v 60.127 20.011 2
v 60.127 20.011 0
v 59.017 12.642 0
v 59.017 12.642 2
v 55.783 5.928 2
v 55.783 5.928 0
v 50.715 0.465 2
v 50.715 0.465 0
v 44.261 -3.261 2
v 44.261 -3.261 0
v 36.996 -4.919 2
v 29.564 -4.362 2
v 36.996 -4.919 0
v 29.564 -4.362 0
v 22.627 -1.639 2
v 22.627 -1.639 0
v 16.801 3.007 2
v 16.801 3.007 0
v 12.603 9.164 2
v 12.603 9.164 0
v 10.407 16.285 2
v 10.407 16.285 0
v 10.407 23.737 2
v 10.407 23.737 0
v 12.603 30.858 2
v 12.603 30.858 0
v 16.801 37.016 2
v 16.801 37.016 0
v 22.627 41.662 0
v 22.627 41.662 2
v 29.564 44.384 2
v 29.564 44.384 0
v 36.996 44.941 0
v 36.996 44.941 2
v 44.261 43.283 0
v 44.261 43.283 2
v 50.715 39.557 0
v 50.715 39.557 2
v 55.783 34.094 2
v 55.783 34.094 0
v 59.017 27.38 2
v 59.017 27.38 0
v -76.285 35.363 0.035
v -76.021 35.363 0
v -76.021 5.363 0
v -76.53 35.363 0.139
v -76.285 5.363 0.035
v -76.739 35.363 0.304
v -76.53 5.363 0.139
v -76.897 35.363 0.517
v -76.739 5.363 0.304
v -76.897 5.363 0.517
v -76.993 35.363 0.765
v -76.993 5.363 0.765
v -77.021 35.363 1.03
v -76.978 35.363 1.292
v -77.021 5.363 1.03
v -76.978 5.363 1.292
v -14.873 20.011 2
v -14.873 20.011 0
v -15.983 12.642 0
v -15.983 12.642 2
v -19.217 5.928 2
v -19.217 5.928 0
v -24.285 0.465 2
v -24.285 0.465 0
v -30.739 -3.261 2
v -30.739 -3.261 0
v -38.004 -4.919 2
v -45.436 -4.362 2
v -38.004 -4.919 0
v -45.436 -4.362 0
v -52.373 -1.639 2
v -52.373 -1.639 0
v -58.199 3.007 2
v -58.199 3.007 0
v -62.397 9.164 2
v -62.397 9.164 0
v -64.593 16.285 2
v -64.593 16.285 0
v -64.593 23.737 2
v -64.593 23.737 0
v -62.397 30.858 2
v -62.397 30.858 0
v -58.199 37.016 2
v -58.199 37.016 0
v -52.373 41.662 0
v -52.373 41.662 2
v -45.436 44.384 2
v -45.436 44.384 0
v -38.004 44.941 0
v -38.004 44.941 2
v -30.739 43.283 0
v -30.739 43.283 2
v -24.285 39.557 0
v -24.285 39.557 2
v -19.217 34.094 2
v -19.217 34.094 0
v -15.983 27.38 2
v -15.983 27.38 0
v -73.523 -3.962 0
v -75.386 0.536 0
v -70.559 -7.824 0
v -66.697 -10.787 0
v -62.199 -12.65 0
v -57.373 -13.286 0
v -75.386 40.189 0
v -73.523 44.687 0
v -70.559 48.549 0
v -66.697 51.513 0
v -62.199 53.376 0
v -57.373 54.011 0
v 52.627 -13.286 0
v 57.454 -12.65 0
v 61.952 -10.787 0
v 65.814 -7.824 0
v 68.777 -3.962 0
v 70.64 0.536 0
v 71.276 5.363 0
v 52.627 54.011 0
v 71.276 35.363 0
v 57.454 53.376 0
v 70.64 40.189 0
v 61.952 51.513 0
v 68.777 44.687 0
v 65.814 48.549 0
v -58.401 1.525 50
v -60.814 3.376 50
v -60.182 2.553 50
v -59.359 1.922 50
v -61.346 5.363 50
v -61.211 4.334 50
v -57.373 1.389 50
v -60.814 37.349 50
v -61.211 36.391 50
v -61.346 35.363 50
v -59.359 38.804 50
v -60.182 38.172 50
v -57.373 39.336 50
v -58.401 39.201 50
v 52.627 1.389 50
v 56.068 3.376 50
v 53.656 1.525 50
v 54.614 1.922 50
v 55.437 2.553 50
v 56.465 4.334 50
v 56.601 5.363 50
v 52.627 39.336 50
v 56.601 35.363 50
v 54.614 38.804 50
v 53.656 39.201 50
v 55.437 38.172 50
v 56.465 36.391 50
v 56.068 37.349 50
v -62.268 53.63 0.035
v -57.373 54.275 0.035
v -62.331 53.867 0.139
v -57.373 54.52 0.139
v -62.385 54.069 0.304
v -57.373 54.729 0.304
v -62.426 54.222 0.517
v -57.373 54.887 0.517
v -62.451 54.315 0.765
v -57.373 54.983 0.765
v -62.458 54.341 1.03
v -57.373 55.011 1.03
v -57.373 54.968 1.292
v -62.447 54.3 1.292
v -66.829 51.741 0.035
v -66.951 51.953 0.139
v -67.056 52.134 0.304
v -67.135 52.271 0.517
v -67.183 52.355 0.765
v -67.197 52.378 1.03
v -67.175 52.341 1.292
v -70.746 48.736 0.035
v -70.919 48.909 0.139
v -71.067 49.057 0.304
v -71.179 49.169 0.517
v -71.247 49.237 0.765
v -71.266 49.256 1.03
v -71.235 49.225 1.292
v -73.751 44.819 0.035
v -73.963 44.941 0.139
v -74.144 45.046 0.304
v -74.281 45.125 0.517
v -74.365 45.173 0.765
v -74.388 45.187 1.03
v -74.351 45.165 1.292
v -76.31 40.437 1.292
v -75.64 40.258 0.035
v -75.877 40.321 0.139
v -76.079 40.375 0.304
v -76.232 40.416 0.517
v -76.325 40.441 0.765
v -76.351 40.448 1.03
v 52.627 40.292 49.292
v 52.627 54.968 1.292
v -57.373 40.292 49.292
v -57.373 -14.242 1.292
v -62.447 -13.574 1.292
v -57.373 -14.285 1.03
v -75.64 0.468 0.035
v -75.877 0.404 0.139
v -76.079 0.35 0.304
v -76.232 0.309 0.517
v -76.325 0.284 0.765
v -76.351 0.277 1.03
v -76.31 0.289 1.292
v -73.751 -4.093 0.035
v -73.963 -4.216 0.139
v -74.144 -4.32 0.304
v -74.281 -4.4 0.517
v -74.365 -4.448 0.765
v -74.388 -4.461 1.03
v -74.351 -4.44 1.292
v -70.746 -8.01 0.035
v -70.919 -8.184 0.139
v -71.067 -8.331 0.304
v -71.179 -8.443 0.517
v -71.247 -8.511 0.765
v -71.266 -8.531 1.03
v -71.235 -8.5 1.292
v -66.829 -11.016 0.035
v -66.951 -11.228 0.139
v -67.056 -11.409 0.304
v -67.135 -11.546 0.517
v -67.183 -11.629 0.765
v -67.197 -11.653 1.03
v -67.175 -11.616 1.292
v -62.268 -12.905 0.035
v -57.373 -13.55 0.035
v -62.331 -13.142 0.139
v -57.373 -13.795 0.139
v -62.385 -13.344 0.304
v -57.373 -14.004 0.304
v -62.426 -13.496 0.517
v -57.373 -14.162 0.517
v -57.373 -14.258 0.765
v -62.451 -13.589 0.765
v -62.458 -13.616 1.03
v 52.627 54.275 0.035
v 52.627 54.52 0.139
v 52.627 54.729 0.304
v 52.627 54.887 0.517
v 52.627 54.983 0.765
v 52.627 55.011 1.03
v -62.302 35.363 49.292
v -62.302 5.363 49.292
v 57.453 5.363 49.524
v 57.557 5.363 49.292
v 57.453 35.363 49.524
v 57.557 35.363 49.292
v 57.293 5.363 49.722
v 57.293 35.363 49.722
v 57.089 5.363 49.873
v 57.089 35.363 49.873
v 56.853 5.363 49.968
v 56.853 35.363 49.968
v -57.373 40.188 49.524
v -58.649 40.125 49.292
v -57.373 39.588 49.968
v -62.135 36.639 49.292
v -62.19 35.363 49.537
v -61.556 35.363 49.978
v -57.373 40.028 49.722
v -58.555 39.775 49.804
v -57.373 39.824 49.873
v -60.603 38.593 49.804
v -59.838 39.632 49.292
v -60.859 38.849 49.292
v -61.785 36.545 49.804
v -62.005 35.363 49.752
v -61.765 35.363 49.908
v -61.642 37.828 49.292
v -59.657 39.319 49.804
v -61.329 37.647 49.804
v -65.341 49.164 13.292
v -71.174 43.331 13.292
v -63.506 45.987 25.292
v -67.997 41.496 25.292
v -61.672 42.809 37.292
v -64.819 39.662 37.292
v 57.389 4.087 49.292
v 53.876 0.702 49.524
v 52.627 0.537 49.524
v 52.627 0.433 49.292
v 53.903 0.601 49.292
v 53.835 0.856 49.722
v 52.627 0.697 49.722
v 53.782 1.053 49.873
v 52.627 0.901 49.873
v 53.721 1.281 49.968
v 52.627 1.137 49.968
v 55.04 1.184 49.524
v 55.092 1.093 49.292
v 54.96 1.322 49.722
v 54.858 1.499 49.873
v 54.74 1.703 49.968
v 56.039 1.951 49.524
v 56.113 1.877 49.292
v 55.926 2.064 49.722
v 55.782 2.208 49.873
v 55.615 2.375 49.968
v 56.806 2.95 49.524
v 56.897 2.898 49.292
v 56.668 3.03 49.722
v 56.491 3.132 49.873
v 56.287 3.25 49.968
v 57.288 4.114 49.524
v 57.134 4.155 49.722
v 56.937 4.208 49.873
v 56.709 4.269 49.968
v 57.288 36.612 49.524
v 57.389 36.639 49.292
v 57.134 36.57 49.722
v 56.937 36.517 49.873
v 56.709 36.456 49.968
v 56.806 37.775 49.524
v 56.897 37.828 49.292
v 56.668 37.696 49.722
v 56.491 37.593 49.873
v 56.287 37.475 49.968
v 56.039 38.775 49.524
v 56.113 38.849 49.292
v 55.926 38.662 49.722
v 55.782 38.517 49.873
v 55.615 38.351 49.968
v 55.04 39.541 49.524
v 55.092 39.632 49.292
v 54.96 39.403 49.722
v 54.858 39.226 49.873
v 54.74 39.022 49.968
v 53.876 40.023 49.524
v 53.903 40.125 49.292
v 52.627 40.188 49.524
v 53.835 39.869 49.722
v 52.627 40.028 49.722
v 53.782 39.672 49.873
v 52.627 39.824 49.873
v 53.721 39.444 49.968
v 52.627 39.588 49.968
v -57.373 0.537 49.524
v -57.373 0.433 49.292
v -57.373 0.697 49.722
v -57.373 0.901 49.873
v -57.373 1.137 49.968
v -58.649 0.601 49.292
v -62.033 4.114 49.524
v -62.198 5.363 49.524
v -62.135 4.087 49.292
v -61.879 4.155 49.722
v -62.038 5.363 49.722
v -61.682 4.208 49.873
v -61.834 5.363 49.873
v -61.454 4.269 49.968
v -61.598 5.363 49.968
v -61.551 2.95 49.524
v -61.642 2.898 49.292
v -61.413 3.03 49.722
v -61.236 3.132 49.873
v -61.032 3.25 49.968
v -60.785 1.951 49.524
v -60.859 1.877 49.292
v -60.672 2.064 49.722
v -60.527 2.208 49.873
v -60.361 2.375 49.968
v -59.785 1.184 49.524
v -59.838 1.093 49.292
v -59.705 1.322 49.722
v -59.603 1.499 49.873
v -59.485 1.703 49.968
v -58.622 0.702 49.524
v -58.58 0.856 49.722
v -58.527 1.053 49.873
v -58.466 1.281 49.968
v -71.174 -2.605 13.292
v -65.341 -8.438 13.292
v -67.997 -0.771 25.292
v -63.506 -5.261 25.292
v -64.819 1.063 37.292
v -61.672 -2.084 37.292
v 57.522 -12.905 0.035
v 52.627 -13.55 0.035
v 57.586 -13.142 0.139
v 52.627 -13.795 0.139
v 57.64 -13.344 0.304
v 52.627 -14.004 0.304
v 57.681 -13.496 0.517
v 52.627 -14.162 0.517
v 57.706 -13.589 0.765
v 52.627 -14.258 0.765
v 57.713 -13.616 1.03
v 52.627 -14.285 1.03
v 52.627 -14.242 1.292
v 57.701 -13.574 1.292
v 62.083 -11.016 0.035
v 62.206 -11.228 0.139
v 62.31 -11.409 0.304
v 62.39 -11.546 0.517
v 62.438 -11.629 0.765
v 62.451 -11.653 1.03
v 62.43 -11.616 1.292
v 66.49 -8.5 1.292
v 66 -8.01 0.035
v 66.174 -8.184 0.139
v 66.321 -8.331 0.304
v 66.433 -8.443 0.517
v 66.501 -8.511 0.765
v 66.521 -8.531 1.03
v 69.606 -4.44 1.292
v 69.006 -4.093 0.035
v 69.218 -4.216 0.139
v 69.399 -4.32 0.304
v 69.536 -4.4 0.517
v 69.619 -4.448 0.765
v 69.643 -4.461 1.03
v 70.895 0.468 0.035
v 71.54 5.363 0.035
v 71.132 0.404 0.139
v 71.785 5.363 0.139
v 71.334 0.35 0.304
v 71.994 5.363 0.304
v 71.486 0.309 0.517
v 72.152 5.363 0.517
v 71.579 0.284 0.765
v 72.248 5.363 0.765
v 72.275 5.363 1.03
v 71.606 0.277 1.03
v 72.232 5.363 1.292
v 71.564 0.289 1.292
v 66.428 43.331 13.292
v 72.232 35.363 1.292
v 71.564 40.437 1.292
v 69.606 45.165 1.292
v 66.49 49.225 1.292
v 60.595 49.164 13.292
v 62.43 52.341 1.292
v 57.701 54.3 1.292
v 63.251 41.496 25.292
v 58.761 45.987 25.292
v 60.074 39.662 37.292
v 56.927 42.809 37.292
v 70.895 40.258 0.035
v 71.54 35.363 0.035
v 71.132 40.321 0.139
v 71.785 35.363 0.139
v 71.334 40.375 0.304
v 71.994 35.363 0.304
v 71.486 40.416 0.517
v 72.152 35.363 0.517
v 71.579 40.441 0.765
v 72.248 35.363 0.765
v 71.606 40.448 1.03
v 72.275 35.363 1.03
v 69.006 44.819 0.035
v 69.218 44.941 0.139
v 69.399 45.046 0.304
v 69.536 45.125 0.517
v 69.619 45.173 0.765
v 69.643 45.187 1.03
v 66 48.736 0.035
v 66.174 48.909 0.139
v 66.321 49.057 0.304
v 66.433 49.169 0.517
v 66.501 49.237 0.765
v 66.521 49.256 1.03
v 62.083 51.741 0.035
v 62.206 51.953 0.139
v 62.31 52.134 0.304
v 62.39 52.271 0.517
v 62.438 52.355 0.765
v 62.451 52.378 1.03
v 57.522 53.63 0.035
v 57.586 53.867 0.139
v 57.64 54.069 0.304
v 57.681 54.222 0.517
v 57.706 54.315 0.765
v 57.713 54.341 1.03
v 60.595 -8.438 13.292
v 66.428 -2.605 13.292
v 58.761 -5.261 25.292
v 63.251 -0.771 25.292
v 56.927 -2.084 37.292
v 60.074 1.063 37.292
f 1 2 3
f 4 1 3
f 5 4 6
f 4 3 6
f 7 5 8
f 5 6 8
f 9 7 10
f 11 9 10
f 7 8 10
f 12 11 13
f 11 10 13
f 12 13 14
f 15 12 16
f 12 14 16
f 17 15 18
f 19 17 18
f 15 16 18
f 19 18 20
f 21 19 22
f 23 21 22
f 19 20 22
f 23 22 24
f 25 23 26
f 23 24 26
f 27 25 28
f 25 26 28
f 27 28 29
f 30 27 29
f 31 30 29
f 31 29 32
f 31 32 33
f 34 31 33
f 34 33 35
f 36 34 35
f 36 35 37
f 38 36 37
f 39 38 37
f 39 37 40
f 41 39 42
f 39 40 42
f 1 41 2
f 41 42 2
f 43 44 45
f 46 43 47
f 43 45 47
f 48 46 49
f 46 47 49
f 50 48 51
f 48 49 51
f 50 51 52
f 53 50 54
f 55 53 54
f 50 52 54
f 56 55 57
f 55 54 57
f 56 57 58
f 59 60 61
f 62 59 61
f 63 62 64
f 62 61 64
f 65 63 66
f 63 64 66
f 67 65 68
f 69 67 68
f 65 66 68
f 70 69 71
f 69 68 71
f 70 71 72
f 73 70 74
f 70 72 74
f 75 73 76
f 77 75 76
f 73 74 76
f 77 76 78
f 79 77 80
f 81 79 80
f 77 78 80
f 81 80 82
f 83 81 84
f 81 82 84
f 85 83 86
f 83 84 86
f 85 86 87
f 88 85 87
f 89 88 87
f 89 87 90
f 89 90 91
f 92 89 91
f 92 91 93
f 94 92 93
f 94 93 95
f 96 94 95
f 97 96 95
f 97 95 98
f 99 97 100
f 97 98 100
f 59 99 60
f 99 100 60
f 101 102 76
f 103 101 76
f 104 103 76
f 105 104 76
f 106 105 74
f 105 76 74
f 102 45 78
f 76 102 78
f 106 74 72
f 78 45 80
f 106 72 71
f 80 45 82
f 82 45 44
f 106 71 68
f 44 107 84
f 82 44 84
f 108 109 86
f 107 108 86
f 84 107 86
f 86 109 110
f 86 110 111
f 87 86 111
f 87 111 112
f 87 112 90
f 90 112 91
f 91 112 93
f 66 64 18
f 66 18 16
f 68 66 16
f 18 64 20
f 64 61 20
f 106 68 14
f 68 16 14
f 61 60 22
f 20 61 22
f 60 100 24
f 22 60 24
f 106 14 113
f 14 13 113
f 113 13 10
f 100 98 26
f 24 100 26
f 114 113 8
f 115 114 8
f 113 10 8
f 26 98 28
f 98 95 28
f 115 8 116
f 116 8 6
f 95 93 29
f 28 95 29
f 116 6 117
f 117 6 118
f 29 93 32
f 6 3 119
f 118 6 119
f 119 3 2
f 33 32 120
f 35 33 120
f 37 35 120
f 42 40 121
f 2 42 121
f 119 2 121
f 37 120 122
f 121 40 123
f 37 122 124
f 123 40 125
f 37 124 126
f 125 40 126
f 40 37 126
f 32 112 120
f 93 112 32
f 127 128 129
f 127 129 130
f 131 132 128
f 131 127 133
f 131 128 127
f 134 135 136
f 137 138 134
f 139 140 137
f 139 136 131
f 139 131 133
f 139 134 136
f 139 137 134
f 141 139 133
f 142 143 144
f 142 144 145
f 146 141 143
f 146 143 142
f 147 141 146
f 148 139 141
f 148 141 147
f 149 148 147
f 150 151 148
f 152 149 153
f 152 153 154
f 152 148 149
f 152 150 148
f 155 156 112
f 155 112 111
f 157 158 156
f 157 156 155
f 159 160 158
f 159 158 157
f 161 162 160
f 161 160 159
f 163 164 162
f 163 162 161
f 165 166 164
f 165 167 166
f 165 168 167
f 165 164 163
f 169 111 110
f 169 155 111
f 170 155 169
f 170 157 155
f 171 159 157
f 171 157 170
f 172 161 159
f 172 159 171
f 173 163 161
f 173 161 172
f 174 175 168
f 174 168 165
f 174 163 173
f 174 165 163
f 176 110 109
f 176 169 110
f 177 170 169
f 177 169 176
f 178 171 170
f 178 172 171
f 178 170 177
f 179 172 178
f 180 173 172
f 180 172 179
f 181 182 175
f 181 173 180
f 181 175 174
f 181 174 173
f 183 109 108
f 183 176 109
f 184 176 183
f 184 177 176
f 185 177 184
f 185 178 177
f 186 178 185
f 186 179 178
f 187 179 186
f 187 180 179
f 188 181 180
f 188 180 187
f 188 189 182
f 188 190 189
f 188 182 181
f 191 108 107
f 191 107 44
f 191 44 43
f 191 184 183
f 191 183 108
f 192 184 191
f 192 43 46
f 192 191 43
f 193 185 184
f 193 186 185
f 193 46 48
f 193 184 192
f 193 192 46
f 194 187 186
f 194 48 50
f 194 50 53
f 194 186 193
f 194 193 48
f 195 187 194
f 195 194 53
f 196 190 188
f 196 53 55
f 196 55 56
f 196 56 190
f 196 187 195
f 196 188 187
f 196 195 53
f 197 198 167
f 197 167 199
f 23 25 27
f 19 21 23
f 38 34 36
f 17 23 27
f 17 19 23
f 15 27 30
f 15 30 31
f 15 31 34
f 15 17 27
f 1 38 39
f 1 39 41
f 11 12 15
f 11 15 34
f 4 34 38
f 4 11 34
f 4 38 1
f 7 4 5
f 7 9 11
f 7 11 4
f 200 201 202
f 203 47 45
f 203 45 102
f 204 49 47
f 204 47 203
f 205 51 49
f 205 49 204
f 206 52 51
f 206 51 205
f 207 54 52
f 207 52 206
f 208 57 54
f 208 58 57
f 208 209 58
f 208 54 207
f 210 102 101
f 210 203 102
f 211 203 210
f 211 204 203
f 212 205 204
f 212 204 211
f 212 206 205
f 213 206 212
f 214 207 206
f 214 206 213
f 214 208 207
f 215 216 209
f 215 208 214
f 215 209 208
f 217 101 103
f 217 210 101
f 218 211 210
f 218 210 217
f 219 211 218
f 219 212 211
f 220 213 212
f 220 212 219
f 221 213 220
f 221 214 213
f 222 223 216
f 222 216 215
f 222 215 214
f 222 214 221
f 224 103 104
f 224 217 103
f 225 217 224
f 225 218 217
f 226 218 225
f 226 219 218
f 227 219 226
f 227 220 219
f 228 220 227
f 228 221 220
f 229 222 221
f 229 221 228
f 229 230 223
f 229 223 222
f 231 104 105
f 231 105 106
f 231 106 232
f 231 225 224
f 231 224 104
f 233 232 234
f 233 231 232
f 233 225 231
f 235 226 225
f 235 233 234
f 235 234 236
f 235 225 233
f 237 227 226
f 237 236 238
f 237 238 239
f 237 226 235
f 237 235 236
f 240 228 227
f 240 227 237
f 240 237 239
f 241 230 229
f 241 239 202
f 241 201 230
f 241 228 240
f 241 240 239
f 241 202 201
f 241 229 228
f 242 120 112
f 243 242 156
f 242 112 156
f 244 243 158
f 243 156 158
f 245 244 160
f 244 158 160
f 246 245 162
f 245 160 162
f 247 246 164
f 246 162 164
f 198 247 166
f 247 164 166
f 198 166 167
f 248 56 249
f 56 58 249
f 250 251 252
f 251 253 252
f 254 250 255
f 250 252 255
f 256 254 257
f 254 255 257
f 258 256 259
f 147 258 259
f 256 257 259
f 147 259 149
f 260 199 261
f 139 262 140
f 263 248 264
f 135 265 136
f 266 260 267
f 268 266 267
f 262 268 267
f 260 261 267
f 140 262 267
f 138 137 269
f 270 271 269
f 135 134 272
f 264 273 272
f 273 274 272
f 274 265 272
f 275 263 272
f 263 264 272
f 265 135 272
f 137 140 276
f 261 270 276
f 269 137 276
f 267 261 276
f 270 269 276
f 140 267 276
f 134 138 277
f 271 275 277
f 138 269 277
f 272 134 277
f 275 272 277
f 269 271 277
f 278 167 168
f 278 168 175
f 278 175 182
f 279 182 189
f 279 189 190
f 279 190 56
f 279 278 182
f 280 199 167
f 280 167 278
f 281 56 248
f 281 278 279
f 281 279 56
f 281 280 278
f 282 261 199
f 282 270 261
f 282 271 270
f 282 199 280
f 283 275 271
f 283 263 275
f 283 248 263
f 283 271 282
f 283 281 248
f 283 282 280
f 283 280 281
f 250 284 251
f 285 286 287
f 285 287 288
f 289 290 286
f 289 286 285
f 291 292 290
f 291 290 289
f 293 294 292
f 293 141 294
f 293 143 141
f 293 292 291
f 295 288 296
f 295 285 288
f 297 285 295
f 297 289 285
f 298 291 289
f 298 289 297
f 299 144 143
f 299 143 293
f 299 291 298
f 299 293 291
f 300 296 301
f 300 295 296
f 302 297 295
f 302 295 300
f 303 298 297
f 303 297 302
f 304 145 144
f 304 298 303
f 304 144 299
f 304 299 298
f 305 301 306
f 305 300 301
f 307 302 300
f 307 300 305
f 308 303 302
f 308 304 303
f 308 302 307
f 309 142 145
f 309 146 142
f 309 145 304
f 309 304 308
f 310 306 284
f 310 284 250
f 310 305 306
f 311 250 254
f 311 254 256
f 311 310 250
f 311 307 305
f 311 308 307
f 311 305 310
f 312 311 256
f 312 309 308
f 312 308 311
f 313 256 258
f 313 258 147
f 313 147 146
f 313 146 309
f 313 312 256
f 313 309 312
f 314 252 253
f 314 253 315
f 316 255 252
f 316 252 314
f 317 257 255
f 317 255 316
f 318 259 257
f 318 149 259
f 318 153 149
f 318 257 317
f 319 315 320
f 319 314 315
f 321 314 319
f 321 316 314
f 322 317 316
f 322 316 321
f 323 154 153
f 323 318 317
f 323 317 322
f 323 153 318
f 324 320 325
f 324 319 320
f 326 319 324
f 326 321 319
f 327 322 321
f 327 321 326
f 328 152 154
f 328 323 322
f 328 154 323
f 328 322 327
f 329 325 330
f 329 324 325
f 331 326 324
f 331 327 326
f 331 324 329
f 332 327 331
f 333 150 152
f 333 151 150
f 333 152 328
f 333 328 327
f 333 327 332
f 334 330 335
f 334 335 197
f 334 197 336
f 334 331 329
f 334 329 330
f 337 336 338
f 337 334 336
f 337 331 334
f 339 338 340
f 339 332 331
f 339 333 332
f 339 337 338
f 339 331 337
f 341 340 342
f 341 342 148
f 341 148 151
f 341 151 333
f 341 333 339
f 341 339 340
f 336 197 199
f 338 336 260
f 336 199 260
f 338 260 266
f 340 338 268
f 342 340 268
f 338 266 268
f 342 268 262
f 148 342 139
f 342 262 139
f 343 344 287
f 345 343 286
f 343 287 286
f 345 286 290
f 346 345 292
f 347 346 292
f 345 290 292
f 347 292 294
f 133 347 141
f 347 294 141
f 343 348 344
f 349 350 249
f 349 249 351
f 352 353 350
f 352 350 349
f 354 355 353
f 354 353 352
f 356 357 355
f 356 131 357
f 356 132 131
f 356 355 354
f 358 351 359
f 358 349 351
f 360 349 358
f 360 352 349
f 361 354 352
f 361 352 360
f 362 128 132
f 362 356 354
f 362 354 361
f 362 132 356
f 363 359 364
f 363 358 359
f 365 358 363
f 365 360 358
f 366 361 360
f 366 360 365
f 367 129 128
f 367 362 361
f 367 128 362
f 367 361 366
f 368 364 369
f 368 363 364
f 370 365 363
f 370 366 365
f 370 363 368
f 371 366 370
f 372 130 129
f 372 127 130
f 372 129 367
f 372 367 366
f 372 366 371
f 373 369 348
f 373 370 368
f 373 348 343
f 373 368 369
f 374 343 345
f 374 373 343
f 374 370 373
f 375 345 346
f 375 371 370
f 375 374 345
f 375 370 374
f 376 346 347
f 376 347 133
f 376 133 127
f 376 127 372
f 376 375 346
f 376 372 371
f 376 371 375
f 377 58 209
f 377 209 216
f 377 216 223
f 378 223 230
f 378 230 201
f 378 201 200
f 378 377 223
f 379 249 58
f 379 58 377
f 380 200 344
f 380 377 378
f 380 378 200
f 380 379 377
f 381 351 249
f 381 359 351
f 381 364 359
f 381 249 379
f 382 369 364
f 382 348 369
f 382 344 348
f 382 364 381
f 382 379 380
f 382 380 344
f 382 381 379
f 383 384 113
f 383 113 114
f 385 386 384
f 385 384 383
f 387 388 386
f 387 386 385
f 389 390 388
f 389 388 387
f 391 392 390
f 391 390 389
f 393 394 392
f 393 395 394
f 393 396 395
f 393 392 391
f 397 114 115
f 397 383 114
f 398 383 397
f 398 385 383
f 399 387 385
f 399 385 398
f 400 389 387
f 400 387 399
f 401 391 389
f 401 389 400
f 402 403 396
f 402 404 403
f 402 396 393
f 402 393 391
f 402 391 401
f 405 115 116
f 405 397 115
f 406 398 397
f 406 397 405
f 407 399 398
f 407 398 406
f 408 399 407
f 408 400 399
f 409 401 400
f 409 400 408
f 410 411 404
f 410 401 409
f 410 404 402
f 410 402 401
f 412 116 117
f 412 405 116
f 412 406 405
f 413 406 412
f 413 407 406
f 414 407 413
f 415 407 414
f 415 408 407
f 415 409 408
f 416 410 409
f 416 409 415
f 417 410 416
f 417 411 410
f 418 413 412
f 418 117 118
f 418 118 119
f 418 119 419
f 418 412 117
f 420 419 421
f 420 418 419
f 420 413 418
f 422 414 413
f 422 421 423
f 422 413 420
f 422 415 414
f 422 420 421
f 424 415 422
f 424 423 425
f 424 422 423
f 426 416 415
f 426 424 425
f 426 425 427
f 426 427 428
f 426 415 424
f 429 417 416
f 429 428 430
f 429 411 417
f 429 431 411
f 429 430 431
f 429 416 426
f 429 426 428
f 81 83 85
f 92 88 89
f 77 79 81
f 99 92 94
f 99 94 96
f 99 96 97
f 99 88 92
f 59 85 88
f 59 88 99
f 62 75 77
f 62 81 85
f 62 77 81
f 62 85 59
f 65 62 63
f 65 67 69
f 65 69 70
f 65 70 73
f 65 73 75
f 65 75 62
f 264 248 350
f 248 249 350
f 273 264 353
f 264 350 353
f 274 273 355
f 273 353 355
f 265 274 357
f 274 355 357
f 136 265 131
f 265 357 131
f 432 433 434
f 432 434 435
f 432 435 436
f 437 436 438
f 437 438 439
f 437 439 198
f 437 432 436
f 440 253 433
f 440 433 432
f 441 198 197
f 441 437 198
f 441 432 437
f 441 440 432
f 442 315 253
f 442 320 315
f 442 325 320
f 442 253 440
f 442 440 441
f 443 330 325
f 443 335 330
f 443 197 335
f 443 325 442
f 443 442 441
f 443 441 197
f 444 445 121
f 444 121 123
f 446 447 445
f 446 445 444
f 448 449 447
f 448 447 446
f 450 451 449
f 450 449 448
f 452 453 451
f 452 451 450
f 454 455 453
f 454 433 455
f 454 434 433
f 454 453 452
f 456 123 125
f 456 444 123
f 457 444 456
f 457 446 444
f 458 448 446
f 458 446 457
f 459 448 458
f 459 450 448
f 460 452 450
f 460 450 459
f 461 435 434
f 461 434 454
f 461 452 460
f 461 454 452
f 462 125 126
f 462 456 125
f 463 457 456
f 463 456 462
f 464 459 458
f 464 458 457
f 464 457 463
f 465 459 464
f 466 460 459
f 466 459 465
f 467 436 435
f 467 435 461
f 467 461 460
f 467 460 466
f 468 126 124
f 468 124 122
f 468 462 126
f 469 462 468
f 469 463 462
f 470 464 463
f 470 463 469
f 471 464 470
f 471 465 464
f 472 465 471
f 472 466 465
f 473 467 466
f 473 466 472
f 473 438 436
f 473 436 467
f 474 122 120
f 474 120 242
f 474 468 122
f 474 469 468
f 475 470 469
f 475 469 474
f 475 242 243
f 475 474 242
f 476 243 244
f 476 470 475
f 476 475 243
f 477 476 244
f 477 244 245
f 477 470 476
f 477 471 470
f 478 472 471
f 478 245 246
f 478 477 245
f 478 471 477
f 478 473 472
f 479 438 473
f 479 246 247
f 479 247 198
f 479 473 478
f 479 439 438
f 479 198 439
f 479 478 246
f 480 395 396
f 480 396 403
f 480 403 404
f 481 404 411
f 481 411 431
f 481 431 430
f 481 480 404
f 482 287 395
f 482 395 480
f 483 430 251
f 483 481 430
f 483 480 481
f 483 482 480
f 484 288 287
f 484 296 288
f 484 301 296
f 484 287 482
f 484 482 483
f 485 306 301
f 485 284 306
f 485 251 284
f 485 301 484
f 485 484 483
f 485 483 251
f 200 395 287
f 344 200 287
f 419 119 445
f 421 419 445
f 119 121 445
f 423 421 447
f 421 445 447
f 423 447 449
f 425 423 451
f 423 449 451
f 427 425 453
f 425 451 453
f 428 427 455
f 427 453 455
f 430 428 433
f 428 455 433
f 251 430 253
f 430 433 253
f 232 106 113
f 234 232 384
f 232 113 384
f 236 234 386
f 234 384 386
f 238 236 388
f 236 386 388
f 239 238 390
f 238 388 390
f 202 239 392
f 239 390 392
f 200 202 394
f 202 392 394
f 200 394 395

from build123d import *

# Parameters (mm, degrees)
F1_DEPTH = 50
F1_TAPER = 17
F2_R     = 1
F3_R     = 25
F4_DEPTH = 2


with BuildPart() as f1:
    # F0 (on Top) → F1 (new body)
    with BuildSketch(Plane.XY):
        with BuildLine():
            Line((52.6273290813, 55.3626765174), (-57.3726709187, 55.3626765174))
            ThreePointArc((-57.3726709187, 55.3626765174), (-71.5148065424, 49.5048121412), (-77.3726709187, 35.3626765174))
            Line((-77.3726709187, 35.3626765174), (-77.3726709187, 5.3626765174))
            ThreePointArc((-77.3726709187, 5.3626765174), (-71.5148065424, -8.7794591063), (-57.3726709187, -14.6373234826))
            Line((-57.3726709187, -14.6373234826), (52.6273290813, -14.6373234826))
            ThreePointArc((52.6273290813, -14.6373234826), (66.769464705, -8.7794591063), (72.6273290813, 5.3626765174))
            Line((72.6273290813, 5.3626765174), (72.6273290813, 35.3626765174))
            ThreePointArc((72.6273290813, 35.3626765174), (66.769464705, 49.5048121412), (52.6273290813, 55.3626765174))
        make_face()
    extrude(amount=F1_DEPTH, taper=F1_TAPER)

    # F2
    f2_edges = [f1.edges().sort_by_distance(p)[0] for p in [
        (72.627329, 20.362677, 0),
        (66.769465, 49.504812, 0),
        (-2.372671, 55.362677, 0),
        (-71.514807, 49.504812, 0),
        (-77.372671, 20.362677, 0),
        (-71.514807, -8.779459, 0),
        (-2.372671, -14.637323, 0),
        (66.769465, -8.779459, 0),
        (57.340795, 20.362677, 50),
        (55.960253, 38.6956, 50),
        (-2.372671, 40.076142, 50),
        (-60.705595, 38.6956, 50),
        (-62.086137, 20.362677, 50),
        (-60.705595, 2.029753, 50),
        (-2.372671, 0.649211, 50),
        (55.960253, 2.029753, 50),
    ]]
    fillet(f2_edges, radius=F2_R)

    # F3 (on face) → F4 (cut)
    with BuildSketch(Plane(origin=(0, 0, 0), x_dir=(1, 0, 0), z_dir=(0, 0, -1))):
        with Locations((35.1273290813, -20.0112540795)):
            Circle(F3_R)
        with Locations((-39.8726709187, -20.0112540795)):
            Circle(F3_R)
    extrude(amount=-F4_DEPTH, mode=Mode.SUBTRACT)


solid = f1.part
